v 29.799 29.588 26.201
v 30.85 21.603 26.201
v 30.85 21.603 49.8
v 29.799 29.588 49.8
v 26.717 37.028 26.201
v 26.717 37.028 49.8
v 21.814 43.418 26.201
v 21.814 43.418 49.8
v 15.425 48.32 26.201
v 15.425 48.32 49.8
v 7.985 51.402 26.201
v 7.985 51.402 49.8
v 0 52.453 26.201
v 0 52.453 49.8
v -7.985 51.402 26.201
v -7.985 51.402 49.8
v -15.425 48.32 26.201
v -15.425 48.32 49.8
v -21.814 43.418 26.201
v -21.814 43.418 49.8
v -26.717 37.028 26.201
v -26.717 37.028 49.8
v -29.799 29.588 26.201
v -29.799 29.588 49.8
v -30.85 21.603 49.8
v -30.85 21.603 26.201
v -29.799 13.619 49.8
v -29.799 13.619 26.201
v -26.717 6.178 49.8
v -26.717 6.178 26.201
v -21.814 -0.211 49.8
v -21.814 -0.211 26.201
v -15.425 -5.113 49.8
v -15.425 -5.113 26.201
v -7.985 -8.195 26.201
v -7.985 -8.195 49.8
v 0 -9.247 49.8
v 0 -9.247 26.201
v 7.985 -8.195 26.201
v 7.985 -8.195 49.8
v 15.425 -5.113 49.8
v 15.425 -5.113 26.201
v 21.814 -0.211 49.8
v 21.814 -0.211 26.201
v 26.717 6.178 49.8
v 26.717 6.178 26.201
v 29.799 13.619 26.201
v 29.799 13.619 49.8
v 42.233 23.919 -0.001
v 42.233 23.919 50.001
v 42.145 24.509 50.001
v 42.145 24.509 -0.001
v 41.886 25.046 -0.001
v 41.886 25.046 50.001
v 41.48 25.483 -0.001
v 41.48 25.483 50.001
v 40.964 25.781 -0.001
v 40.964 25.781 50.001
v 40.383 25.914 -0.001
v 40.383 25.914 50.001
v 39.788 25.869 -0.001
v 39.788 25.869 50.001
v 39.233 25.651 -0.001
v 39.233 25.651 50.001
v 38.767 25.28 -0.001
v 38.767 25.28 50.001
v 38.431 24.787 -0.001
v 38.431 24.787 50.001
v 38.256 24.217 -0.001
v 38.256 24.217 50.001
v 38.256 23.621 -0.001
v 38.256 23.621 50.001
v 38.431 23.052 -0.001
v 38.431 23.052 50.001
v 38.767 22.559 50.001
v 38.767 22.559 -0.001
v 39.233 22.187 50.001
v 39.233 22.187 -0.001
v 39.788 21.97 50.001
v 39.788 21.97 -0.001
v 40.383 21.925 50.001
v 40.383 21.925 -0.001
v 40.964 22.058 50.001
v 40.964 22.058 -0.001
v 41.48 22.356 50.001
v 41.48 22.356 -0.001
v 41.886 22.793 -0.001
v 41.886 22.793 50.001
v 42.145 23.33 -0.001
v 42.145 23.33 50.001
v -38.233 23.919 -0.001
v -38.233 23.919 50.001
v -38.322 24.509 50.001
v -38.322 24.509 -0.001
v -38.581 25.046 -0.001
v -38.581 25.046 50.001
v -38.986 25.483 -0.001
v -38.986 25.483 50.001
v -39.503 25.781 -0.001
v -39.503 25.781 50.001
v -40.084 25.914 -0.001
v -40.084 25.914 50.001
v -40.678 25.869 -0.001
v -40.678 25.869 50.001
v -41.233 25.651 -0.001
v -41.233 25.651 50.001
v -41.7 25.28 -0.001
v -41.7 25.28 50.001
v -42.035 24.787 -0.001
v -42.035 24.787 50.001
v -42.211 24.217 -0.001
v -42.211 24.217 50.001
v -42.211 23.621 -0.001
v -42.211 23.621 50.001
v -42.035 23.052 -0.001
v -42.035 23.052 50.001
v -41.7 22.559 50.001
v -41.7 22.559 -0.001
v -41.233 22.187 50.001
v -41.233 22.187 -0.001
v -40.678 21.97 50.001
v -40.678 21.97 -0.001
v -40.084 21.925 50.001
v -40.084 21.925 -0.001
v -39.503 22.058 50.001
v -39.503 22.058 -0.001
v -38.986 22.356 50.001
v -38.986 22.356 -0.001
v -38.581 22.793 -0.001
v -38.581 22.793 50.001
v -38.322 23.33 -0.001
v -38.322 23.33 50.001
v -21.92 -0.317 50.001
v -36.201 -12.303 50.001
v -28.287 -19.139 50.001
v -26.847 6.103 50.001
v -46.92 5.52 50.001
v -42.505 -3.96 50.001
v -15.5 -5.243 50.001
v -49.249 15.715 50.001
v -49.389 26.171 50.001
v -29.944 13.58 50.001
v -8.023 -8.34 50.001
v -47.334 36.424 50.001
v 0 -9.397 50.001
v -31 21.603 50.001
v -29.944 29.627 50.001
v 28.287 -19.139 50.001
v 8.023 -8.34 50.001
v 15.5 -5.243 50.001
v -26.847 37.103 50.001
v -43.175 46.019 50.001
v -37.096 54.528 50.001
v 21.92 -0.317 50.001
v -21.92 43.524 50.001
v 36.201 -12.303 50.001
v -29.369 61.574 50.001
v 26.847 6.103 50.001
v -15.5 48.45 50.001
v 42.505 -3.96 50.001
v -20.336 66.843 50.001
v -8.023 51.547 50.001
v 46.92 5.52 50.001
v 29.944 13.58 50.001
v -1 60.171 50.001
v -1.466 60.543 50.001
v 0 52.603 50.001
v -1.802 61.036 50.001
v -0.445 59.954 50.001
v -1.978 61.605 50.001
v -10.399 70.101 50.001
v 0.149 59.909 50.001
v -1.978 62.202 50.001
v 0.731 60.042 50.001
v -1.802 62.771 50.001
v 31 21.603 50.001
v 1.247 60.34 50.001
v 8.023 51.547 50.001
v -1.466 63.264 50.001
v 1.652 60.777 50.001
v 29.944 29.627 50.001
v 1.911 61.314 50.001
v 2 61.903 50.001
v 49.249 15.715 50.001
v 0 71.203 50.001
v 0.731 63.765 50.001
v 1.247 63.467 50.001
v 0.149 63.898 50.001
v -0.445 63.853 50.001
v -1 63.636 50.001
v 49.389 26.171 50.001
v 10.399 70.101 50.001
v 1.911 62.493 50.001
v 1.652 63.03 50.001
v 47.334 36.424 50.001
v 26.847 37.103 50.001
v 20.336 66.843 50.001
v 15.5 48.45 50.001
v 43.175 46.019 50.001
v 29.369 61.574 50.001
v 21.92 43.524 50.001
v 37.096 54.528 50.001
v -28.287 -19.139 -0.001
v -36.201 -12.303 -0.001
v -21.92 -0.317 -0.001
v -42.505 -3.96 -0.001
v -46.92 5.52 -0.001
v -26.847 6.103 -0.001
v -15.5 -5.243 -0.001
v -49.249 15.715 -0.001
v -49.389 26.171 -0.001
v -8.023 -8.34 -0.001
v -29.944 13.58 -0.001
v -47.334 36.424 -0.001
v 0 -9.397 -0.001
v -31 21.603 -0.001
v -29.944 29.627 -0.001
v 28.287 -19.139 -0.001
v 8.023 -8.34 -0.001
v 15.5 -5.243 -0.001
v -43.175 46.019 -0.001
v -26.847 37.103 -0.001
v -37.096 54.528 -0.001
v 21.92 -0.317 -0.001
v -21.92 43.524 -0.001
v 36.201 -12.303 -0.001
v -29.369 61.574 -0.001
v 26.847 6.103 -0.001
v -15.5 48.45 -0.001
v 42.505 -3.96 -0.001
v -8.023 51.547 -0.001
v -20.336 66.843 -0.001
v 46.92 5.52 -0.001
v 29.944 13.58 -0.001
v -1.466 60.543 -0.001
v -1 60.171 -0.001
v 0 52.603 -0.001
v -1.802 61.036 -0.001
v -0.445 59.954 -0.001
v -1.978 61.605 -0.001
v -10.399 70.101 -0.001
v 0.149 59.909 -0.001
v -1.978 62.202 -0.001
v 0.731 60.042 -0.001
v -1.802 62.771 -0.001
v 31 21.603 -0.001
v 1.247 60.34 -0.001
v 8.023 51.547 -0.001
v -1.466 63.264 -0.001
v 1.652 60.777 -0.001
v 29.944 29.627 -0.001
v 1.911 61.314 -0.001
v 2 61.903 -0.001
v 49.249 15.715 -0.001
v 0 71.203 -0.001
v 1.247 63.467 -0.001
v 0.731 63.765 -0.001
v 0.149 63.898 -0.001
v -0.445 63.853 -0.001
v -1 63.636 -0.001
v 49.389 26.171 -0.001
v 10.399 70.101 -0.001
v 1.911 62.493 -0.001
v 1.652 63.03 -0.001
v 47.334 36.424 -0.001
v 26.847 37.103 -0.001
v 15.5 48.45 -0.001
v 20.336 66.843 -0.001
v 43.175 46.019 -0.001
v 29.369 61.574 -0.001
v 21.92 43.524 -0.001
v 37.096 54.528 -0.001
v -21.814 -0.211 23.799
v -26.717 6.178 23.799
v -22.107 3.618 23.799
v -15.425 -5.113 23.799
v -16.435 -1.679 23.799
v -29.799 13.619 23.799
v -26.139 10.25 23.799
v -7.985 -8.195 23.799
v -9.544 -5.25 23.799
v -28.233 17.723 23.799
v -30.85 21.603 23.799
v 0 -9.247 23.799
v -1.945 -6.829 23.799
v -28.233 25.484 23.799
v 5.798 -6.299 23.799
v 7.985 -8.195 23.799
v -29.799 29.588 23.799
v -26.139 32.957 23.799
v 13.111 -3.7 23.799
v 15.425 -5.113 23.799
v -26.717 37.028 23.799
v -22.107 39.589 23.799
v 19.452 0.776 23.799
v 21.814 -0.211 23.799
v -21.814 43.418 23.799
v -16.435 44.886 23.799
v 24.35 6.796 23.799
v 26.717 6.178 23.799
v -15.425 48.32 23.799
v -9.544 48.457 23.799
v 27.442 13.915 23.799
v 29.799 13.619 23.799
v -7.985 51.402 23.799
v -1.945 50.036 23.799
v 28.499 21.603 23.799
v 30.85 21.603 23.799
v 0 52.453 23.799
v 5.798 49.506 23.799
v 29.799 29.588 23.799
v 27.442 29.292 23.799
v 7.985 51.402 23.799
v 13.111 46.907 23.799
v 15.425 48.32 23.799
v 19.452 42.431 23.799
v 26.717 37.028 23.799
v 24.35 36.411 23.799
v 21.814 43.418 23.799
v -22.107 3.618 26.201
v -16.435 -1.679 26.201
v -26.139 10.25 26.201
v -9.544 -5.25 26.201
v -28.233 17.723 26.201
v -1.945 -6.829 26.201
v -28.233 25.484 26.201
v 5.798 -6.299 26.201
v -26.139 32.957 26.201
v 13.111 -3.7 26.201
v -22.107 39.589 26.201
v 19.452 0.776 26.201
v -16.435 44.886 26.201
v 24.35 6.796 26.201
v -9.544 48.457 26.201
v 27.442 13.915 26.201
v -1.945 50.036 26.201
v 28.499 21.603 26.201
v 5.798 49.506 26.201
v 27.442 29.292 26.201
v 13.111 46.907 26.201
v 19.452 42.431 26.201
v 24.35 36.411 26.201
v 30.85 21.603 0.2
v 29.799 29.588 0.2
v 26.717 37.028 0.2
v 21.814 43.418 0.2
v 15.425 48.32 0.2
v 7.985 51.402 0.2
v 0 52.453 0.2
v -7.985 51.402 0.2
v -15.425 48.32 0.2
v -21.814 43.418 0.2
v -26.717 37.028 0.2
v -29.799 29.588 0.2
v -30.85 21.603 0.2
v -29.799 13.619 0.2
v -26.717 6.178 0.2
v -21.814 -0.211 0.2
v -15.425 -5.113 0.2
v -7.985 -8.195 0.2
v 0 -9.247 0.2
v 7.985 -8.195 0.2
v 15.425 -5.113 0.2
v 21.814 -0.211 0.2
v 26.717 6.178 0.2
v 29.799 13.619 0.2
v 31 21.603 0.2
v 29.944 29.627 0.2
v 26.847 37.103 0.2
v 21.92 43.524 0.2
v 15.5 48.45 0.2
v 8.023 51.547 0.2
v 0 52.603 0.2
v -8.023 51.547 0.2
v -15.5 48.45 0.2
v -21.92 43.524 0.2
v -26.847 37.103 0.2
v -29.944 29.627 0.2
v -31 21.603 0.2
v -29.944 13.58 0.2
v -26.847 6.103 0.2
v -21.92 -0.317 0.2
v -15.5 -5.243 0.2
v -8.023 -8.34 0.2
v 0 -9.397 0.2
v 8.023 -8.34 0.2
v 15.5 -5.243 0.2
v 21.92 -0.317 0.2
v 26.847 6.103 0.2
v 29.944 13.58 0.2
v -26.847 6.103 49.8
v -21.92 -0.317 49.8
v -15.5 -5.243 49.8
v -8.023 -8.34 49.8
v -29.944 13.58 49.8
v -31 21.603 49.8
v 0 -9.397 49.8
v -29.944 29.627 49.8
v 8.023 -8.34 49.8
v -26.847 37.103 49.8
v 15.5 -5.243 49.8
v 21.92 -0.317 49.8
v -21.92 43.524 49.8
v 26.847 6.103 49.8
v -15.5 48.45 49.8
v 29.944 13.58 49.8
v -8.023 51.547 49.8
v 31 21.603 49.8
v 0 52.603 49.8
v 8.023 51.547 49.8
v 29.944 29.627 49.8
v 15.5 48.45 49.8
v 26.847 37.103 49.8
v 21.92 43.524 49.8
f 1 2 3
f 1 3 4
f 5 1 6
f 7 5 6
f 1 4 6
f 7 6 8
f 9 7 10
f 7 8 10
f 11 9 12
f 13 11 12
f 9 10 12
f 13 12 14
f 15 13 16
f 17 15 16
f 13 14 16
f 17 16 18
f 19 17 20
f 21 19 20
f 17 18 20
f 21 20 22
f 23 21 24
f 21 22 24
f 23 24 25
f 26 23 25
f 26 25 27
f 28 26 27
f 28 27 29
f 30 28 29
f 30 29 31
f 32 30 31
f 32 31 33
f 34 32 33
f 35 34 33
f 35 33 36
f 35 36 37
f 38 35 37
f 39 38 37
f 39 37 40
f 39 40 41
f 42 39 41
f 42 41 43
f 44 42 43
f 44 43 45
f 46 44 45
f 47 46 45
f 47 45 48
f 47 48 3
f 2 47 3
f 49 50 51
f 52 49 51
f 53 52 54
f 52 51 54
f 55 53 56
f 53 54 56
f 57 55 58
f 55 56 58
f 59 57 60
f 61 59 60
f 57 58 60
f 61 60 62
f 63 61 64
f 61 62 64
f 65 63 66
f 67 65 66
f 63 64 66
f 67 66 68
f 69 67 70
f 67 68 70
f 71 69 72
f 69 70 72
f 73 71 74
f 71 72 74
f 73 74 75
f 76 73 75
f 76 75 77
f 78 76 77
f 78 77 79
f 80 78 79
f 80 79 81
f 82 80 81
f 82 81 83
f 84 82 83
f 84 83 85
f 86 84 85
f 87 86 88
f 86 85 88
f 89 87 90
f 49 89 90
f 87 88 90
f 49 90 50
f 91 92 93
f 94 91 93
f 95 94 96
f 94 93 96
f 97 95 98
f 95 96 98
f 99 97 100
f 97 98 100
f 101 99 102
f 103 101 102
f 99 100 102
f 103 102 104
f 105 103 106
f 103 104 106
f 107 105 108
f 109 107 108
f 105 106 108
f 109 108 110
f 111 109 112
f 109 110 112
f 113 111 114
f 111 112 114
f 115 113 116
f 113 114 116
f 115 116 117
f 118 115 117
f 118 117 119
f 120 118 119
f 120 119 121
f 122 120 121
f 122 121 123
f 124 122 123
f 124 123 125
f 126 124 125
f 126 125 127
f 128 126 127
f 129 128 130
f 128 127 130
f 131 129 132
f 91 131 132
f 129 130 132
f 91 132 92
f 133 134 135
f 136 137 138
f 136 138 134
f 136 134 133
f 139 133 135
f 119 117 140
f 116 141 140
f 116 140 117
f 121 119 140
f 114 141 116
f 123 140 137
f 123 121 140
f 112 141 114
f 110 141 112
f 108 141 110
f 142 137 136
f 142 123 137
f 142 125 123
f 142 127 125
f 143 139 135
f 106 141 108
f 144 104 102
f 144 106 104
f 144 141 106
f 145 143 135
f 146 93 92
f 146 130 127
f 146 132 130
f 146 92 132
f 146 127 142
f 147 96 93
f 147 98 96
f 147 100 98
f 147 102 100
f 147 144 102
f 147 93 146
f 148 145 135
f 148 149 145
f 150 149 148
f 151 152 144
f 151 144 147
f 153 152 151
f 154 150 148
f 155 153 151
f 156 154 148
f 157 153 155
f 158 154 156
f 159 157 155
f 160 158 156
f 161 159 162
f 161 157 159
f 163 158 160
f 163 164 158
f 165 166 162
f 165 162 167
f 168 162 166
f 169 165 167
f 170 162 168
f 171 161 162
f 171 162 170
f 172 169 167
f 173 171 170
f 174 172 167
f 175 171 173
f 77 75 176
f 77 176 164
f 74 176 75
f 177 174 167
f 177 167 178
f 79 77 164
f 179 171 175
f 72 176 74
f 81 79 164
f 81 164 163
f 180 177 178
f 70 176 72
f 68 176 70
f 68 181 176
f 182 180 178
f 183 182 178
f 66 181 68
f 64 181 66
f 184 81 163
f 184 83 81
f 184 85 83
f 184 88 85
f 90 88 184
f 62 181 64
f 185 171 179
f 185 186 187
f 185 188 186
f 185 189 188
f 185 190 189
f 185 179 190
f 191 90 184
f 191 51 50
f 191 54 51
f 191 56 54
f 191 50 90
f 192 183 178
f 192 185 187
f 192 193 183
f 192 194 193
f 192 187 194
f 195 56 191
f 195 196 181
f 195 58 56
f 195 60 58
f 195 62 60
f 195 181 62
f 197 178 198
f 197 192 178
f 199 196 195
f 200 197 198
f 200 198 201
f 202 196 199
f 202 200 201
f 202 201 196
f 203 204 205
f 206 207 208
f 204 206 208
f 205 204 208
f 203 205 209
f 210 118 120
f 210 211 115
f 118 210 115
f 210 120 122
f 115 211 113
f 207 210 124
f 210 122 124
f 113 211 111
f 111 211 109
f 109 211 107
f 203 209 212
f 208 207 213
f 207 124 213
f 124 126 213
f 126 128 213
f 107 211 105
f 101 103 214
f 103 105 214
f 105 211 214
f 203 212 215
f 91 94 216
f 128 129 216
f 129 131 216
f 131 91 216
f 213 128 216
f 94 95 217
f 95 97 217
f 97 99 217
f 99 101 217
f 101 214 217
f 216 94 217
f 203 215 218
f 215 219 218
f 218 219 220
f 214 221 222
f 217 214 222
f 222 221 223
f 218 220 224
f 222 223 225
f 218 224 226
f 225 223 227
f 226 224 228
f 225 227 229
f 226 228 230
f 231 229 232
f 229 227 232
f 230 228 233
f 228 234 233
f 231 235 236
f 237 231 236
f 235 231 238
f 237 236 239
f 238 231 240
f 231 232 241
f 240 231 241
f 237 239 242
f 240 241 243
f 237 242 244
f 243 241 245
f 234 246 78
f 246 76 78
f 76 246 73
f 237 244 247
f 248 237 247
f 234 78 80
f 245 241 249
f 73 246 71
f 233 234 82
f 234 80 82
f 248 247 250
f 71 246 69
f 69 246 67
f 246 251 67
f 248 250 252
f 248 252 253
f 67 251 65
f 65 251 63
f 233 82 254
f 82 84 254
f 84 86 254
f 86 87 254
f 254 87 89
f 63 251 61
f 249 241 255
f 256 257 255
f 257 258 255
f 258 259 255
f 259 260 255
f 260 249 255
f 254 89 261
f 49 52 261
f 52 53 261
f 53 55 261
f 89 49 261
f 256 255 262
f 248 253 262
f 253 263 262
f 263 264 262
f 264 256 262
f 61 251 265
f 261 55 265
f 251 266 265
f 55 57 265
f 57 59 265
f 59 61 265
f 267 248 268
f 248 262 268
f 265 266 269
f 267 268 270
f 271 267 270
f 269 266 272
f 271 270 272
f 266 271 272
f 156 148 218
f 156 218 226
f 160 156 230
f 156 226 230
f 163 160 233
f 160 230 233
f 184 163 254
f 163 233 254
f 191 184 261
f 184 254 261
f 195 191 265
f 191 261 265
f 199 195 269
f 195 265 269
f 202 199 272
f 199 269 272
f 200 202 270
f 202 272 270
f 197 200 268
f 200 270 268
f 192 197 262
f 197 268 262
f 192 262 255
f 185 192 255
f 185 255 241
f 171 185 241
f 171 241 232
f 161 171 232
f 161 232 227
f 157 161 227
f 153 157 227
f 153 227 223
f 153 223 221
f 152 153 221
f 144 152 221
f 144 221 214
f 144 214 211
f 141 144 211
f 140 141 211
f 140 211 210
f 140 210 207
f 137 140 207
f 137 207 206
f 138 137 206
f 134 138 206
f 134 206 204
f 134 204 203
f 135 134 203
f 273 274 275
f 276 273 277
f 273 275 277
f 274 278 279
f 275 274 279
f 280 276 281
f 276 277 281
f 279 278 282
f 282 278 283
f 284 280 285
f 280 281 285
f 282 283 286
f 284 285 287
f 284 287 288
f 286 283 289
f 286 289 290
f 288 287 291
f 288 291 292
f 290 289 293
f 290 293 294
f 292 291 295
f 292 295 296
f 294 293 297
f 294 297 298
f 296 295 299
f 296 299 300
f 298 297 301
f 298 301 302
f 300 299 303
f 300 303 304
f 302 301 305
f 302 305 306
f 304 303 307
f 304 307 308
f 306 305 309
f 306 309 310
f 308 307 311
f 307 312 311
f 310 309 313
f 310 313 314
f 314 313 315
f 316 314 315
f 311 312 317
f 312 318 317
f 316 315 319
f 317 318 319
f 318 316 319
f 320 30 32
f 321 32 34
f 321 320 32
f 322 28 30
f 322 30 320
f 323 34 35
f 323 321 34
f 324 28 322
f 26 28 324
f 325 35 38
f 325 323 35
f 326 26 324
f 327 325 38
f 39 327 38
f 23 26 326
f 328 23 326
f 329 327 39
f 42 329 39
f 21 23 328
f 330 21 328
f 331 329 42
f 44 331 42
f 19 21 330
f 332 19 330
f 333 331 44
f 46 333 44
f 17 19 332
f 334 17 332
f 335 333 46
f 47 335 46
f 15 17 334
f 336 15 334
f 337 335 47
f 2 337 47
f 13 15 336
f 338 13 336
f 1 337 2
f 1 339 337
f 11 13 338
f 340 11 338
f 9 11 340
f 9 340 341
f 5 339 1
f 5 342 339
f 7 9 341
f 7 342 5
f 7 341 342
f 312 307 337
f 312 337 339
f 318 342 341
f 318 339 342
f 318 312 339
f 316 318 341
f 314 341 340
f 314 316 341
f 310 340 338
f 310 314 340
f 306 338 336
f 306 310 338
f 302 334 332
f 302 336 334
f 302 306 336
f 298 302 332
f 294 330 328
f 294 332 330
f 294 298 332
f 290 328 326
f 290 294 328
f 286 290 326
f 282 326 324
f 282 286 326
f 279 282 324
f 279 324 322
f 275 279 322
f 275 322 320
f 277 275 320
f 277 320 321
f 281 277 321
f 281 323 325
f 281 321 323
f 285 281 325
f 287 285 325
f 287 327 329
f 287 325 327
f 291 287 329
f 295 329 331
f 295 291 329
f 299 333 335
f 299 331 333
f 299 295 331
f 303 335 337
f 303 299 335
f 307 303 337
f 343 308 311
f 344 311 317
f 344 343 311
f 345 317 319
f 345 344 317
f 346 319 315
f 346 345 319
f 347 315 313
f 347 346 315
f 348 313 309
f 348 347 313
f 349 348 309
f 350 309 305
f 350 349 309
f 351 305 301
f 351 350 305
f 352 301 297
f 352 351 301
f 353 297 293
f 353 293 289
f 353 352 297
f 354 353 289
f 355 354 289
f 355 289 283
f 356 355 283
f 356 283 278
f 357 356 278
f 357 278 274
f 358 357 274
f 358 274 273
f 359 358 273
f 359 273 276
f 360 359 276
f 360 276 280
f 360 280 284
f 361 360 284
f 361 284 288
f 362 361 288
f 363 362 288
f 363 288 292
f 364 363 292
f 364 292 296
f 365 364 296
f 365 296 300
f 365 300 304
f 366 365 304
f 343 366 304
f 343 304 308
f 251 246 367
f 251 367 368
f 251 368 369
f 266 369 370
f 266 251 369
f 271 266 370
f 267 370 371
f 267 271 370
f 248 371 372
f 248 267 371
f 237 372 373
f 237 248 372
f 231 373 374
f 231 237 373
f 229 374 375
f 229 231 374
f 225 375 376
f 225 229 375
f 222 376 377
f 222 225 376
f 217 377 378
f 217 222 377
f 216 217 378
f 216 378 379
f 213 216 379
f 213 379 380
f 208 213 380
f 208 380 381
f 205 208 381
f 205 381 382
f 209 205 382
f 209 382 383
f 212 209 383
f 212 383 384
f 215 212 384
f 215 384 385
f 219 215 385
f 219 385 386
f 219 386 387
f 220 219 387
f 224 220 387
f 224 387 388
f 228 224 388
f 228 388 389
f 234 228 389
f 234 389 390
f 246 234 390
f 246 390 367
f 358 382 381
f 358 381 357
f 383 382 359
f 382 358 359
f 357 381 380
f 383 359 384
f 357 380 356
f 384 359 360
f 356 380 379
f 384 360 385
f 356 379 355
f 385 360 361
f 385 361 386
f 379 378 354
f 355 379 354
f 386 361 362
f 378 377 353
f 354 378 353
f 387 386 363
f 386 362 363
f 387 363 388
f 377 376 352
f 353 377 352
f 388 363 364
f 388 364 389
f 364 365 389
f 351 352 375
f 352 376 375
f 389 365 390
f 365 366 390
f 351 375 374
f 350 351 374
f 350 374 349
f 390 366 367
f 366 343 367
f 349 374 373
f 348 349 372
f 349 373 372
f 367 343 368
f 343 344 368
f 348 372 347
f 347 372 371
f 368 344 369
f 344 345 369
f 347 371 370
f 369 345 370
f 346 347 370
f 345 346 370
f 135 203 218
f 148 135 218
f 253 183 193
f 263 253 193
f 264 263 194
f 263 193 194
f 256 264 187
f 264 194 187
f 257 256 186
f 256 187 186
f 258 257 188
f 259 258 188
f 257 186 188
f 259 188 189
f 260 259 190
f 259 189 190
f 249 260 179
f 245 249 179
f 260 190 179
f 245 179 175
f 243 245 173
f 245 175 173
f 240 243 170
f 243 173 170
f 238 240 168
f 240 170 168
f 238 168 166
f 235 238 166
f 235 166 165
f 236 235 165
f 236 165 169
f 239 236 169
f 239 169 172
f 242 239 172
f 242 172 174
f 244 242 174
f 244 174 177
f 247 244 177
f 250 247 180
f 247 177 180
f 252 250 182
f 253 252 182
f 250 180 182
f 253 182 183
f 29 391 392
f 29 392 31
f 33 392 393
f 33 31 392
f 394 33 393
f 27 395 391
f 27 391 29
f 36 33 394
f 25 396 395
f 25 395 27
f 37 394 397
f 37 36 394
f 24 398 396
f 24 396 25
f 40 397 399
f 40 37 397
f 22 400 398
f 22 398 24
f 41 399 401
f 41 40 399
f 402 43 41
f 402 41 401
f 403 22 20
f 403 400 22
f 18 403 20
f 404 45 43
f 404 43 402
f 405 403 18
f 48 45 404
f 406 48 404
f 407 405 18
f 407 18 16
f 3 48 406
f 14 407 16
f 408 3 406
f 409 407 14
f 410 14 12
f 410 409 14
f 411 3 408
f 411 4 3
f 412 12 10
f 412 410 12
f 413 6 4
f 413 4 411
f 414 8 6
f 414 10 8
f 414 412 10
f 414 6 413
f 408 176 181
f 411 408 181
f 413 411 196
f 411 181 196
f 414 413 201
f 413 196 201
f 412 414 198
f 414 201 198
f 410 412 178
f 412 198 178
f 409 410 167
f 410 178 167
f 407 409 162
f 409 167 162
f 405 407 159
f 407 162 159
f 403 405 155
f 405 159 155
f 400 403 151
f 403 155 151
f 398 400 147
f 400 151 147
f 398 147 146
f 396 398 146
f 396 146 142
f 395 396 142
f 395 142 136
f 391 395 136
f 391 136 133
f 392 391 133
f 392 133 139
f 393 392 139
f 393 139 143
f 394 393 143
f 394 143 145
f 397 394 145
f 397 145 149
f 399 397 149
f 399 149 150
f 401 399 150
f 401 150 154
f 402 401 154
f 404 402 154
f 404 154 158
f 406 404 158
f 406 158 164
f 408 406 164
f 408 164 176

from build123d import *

# Parameters (mm, degrees)
SKETCH1_R           = 16.5
BOSS_EXTRUDE1_DEPTH = 50
SKETCH2_R           = 17.5
CUT_EXTRUDE1_DEPTH  = 11
SKETCH3_R           = 2
CUT_EXTRUDE2_DEPTH  = 10
SCALE1_SCALE        = 1.771428571
BOSS_EXTRUDE2_START = -49.599999988
SKETCH4_R           = 29.228571421
SKETCH4_R_2         = 28.498571422
BOSS_EXTRUDE2_DEPTH = 49.599999988
CUT_EXTRUDE6_START  = -44.285714
SKETCH6_R           = 28.498571422
CUT_EXTRUDE6_DEPTH  = 19.285
CUT_EXTRUDE7_START  = 50.000714
SKETCH7_R           = 28.498571422
CUT_EXTRUDE7_DEPTH  = 19.285
SKETCH9_R           = 30.85
CUT_EXTRUDE8_DEPTH  = 23.8
SKETCH10_R          = 2
CUT_EXTRUDE9_DEPTH  = 50.00142855


with BuildPart() as part:
    # Sketch1 → Boss-Extrude1 (new body)
    with BuildSketch(Plane.XY):
        with BuildLine():
            Line((-15.968719423, 0), (15.968719423, 0))
            ThreePointArc((15.968719423, 0), (0, 51), (-15.968719423, 0))
        make_face()
        with Locations((0, 23)):
            Circle(SKETCH1_R, mode=Mode.SUBTRACT)
    extrude(amount=BOSS_EXTRUDE1_DEPTH)

    # Sketch2 → Cut-Extrude1 (cut)
    with BuildSketch(Plane.XY.offset(50)):
        with Locations((0, 23)):
            Circle(SKETCH2_R)
    cut_extrude1 = extrude(amount=-CUT_EXTRUDE1_DEPTH, mode=Mode.SUBTRACT)

    # Mirror1: Cut-Extrude1 across plane
    add(cut_extrude1.mirror(Plane.XY.offset(25)), mode=Mode.SUBTRACT)

    # Sketch3 → Cut-Extrude2 (cut)
    with BuildSketch(Plane(origin=(0, 0, 0), x_dir=(-1, 0, 0), z_dir=(0, 0, -1))):
        with Locations((0, 45.5)):
            Circle(SKETCH3_R)
        with Locations((-22.5, 23)):
            Circle(SKETCH3_R)
        with Locations((22.5, 23)):
            Circle(SKETCH3_R)
    cut_extrude2 = extrude(amount=-CUT_EXTRUDE2_DEPTH, mode=Mode.SUBTRACT)

    # Mirror2: Cut-Extrude2 across plane
    add(cut_extrude2.mirror(Plane.XY.offset(25)), mode=Mode.SUBTRACT)


with BuildPart() as part_1:
    # Scale1: scaled about (0, 24.810283146, 25)
    add(part.part.scale(SCALE1_SCALE).moved(Location((0, -19.139361273, -19.285714275))))

    # Sketch4 → Boss-Extrude2 (add)
    with BuildSketch(Plane.XY.offset(49.799999994).offset(BOSS_EXTRUDE2_START)):
        with Locations((0, 21.60349586)):
            Circle(SKETCH4_R)
        with Locations((0, 21.60349586)):
            Circle(SKETCH4_R_2, mode=Mode.SUBTRACT)
    extrude(amount=BOSS_EXTRUDE2_DEPTH)

    # Sketch6 → Cut-Extrude6 (cut)
    with BuildSketch(Plane.XY.offset(25).offset(CUT_EXTRUDE6_START)):
        with BuildLine():
            Line((-28.287445828, -19.139361273), (28.287445828, -19.139361273))
            ThreePointArc((28.287445828, -19.139361273), (0, 71.203495848), (-28.287445828, -19.139361273))
        make_face()
        with Locations((0, 21.60349586)):
            Circle(SKETCH6_R, mode=Mode.SUBTRACT)
    extrude(amount=CUT_EXTRUDE6_DEPTH, mode=Mode.SUBTRACT)

    # Sketch7 → Cut-Extrude7 (cut)
    with BuildSketch(Plane.XY.offset(CUT_EXTRUDE7_START)):
        with BuildLine():
            Line((-28.287445828, -19.139361273), (28.287445828, -19.139361273))
            ThreePointArc((28.287445828, -19.139361273), (0, 71.203495848), (-28.287445828, -19.139361273))
        make_face()
        with Locations((0, 21.60349586)):
            Circle(SKETCH7_R, mode=Mode.SUBTRACT)
    extrude(amount=CUT_EXTRUDE7_DEPTH, mode=Mode.SUBTRACT)

    # Sketch9 → Cut-Extrude8 (cut)
    with BuildSketch(Plane.XY.offset(50.000714275)):
        with Locations((0, 21.60349586)):
            Circle(SKETCH9_R)
    cut_extrude8 = extrude(amount=-CUT_EXTRUDE8_DEPTH, mode=Mode.SUBTRACT)

    # Mirror3: Cut-Extrude8 across plane
    add(cut_extrude8.mirror(Plane.XY.offset(25)), mode=Mode.SUBTRACT)

    # Sketch10 → Cut-Extrude9 (cut)
    with BuildSketch(Plane.XY.offset(50.000714275)):
        with Locations((0, 61.90349586)):
            Circle(SKETCH10_R)
        with Locations((-40.233402491, 23.919381004)):
            Circle(SKETCH10_R)
        with Locations((40.233400771, 23.919410876)):
            Circle(SKETCH10_R)
    extrude(amount=-CUT_EXTRUDE9_DEPTH, mode=Mode.SUBTRACT)


solid = part_1.part
